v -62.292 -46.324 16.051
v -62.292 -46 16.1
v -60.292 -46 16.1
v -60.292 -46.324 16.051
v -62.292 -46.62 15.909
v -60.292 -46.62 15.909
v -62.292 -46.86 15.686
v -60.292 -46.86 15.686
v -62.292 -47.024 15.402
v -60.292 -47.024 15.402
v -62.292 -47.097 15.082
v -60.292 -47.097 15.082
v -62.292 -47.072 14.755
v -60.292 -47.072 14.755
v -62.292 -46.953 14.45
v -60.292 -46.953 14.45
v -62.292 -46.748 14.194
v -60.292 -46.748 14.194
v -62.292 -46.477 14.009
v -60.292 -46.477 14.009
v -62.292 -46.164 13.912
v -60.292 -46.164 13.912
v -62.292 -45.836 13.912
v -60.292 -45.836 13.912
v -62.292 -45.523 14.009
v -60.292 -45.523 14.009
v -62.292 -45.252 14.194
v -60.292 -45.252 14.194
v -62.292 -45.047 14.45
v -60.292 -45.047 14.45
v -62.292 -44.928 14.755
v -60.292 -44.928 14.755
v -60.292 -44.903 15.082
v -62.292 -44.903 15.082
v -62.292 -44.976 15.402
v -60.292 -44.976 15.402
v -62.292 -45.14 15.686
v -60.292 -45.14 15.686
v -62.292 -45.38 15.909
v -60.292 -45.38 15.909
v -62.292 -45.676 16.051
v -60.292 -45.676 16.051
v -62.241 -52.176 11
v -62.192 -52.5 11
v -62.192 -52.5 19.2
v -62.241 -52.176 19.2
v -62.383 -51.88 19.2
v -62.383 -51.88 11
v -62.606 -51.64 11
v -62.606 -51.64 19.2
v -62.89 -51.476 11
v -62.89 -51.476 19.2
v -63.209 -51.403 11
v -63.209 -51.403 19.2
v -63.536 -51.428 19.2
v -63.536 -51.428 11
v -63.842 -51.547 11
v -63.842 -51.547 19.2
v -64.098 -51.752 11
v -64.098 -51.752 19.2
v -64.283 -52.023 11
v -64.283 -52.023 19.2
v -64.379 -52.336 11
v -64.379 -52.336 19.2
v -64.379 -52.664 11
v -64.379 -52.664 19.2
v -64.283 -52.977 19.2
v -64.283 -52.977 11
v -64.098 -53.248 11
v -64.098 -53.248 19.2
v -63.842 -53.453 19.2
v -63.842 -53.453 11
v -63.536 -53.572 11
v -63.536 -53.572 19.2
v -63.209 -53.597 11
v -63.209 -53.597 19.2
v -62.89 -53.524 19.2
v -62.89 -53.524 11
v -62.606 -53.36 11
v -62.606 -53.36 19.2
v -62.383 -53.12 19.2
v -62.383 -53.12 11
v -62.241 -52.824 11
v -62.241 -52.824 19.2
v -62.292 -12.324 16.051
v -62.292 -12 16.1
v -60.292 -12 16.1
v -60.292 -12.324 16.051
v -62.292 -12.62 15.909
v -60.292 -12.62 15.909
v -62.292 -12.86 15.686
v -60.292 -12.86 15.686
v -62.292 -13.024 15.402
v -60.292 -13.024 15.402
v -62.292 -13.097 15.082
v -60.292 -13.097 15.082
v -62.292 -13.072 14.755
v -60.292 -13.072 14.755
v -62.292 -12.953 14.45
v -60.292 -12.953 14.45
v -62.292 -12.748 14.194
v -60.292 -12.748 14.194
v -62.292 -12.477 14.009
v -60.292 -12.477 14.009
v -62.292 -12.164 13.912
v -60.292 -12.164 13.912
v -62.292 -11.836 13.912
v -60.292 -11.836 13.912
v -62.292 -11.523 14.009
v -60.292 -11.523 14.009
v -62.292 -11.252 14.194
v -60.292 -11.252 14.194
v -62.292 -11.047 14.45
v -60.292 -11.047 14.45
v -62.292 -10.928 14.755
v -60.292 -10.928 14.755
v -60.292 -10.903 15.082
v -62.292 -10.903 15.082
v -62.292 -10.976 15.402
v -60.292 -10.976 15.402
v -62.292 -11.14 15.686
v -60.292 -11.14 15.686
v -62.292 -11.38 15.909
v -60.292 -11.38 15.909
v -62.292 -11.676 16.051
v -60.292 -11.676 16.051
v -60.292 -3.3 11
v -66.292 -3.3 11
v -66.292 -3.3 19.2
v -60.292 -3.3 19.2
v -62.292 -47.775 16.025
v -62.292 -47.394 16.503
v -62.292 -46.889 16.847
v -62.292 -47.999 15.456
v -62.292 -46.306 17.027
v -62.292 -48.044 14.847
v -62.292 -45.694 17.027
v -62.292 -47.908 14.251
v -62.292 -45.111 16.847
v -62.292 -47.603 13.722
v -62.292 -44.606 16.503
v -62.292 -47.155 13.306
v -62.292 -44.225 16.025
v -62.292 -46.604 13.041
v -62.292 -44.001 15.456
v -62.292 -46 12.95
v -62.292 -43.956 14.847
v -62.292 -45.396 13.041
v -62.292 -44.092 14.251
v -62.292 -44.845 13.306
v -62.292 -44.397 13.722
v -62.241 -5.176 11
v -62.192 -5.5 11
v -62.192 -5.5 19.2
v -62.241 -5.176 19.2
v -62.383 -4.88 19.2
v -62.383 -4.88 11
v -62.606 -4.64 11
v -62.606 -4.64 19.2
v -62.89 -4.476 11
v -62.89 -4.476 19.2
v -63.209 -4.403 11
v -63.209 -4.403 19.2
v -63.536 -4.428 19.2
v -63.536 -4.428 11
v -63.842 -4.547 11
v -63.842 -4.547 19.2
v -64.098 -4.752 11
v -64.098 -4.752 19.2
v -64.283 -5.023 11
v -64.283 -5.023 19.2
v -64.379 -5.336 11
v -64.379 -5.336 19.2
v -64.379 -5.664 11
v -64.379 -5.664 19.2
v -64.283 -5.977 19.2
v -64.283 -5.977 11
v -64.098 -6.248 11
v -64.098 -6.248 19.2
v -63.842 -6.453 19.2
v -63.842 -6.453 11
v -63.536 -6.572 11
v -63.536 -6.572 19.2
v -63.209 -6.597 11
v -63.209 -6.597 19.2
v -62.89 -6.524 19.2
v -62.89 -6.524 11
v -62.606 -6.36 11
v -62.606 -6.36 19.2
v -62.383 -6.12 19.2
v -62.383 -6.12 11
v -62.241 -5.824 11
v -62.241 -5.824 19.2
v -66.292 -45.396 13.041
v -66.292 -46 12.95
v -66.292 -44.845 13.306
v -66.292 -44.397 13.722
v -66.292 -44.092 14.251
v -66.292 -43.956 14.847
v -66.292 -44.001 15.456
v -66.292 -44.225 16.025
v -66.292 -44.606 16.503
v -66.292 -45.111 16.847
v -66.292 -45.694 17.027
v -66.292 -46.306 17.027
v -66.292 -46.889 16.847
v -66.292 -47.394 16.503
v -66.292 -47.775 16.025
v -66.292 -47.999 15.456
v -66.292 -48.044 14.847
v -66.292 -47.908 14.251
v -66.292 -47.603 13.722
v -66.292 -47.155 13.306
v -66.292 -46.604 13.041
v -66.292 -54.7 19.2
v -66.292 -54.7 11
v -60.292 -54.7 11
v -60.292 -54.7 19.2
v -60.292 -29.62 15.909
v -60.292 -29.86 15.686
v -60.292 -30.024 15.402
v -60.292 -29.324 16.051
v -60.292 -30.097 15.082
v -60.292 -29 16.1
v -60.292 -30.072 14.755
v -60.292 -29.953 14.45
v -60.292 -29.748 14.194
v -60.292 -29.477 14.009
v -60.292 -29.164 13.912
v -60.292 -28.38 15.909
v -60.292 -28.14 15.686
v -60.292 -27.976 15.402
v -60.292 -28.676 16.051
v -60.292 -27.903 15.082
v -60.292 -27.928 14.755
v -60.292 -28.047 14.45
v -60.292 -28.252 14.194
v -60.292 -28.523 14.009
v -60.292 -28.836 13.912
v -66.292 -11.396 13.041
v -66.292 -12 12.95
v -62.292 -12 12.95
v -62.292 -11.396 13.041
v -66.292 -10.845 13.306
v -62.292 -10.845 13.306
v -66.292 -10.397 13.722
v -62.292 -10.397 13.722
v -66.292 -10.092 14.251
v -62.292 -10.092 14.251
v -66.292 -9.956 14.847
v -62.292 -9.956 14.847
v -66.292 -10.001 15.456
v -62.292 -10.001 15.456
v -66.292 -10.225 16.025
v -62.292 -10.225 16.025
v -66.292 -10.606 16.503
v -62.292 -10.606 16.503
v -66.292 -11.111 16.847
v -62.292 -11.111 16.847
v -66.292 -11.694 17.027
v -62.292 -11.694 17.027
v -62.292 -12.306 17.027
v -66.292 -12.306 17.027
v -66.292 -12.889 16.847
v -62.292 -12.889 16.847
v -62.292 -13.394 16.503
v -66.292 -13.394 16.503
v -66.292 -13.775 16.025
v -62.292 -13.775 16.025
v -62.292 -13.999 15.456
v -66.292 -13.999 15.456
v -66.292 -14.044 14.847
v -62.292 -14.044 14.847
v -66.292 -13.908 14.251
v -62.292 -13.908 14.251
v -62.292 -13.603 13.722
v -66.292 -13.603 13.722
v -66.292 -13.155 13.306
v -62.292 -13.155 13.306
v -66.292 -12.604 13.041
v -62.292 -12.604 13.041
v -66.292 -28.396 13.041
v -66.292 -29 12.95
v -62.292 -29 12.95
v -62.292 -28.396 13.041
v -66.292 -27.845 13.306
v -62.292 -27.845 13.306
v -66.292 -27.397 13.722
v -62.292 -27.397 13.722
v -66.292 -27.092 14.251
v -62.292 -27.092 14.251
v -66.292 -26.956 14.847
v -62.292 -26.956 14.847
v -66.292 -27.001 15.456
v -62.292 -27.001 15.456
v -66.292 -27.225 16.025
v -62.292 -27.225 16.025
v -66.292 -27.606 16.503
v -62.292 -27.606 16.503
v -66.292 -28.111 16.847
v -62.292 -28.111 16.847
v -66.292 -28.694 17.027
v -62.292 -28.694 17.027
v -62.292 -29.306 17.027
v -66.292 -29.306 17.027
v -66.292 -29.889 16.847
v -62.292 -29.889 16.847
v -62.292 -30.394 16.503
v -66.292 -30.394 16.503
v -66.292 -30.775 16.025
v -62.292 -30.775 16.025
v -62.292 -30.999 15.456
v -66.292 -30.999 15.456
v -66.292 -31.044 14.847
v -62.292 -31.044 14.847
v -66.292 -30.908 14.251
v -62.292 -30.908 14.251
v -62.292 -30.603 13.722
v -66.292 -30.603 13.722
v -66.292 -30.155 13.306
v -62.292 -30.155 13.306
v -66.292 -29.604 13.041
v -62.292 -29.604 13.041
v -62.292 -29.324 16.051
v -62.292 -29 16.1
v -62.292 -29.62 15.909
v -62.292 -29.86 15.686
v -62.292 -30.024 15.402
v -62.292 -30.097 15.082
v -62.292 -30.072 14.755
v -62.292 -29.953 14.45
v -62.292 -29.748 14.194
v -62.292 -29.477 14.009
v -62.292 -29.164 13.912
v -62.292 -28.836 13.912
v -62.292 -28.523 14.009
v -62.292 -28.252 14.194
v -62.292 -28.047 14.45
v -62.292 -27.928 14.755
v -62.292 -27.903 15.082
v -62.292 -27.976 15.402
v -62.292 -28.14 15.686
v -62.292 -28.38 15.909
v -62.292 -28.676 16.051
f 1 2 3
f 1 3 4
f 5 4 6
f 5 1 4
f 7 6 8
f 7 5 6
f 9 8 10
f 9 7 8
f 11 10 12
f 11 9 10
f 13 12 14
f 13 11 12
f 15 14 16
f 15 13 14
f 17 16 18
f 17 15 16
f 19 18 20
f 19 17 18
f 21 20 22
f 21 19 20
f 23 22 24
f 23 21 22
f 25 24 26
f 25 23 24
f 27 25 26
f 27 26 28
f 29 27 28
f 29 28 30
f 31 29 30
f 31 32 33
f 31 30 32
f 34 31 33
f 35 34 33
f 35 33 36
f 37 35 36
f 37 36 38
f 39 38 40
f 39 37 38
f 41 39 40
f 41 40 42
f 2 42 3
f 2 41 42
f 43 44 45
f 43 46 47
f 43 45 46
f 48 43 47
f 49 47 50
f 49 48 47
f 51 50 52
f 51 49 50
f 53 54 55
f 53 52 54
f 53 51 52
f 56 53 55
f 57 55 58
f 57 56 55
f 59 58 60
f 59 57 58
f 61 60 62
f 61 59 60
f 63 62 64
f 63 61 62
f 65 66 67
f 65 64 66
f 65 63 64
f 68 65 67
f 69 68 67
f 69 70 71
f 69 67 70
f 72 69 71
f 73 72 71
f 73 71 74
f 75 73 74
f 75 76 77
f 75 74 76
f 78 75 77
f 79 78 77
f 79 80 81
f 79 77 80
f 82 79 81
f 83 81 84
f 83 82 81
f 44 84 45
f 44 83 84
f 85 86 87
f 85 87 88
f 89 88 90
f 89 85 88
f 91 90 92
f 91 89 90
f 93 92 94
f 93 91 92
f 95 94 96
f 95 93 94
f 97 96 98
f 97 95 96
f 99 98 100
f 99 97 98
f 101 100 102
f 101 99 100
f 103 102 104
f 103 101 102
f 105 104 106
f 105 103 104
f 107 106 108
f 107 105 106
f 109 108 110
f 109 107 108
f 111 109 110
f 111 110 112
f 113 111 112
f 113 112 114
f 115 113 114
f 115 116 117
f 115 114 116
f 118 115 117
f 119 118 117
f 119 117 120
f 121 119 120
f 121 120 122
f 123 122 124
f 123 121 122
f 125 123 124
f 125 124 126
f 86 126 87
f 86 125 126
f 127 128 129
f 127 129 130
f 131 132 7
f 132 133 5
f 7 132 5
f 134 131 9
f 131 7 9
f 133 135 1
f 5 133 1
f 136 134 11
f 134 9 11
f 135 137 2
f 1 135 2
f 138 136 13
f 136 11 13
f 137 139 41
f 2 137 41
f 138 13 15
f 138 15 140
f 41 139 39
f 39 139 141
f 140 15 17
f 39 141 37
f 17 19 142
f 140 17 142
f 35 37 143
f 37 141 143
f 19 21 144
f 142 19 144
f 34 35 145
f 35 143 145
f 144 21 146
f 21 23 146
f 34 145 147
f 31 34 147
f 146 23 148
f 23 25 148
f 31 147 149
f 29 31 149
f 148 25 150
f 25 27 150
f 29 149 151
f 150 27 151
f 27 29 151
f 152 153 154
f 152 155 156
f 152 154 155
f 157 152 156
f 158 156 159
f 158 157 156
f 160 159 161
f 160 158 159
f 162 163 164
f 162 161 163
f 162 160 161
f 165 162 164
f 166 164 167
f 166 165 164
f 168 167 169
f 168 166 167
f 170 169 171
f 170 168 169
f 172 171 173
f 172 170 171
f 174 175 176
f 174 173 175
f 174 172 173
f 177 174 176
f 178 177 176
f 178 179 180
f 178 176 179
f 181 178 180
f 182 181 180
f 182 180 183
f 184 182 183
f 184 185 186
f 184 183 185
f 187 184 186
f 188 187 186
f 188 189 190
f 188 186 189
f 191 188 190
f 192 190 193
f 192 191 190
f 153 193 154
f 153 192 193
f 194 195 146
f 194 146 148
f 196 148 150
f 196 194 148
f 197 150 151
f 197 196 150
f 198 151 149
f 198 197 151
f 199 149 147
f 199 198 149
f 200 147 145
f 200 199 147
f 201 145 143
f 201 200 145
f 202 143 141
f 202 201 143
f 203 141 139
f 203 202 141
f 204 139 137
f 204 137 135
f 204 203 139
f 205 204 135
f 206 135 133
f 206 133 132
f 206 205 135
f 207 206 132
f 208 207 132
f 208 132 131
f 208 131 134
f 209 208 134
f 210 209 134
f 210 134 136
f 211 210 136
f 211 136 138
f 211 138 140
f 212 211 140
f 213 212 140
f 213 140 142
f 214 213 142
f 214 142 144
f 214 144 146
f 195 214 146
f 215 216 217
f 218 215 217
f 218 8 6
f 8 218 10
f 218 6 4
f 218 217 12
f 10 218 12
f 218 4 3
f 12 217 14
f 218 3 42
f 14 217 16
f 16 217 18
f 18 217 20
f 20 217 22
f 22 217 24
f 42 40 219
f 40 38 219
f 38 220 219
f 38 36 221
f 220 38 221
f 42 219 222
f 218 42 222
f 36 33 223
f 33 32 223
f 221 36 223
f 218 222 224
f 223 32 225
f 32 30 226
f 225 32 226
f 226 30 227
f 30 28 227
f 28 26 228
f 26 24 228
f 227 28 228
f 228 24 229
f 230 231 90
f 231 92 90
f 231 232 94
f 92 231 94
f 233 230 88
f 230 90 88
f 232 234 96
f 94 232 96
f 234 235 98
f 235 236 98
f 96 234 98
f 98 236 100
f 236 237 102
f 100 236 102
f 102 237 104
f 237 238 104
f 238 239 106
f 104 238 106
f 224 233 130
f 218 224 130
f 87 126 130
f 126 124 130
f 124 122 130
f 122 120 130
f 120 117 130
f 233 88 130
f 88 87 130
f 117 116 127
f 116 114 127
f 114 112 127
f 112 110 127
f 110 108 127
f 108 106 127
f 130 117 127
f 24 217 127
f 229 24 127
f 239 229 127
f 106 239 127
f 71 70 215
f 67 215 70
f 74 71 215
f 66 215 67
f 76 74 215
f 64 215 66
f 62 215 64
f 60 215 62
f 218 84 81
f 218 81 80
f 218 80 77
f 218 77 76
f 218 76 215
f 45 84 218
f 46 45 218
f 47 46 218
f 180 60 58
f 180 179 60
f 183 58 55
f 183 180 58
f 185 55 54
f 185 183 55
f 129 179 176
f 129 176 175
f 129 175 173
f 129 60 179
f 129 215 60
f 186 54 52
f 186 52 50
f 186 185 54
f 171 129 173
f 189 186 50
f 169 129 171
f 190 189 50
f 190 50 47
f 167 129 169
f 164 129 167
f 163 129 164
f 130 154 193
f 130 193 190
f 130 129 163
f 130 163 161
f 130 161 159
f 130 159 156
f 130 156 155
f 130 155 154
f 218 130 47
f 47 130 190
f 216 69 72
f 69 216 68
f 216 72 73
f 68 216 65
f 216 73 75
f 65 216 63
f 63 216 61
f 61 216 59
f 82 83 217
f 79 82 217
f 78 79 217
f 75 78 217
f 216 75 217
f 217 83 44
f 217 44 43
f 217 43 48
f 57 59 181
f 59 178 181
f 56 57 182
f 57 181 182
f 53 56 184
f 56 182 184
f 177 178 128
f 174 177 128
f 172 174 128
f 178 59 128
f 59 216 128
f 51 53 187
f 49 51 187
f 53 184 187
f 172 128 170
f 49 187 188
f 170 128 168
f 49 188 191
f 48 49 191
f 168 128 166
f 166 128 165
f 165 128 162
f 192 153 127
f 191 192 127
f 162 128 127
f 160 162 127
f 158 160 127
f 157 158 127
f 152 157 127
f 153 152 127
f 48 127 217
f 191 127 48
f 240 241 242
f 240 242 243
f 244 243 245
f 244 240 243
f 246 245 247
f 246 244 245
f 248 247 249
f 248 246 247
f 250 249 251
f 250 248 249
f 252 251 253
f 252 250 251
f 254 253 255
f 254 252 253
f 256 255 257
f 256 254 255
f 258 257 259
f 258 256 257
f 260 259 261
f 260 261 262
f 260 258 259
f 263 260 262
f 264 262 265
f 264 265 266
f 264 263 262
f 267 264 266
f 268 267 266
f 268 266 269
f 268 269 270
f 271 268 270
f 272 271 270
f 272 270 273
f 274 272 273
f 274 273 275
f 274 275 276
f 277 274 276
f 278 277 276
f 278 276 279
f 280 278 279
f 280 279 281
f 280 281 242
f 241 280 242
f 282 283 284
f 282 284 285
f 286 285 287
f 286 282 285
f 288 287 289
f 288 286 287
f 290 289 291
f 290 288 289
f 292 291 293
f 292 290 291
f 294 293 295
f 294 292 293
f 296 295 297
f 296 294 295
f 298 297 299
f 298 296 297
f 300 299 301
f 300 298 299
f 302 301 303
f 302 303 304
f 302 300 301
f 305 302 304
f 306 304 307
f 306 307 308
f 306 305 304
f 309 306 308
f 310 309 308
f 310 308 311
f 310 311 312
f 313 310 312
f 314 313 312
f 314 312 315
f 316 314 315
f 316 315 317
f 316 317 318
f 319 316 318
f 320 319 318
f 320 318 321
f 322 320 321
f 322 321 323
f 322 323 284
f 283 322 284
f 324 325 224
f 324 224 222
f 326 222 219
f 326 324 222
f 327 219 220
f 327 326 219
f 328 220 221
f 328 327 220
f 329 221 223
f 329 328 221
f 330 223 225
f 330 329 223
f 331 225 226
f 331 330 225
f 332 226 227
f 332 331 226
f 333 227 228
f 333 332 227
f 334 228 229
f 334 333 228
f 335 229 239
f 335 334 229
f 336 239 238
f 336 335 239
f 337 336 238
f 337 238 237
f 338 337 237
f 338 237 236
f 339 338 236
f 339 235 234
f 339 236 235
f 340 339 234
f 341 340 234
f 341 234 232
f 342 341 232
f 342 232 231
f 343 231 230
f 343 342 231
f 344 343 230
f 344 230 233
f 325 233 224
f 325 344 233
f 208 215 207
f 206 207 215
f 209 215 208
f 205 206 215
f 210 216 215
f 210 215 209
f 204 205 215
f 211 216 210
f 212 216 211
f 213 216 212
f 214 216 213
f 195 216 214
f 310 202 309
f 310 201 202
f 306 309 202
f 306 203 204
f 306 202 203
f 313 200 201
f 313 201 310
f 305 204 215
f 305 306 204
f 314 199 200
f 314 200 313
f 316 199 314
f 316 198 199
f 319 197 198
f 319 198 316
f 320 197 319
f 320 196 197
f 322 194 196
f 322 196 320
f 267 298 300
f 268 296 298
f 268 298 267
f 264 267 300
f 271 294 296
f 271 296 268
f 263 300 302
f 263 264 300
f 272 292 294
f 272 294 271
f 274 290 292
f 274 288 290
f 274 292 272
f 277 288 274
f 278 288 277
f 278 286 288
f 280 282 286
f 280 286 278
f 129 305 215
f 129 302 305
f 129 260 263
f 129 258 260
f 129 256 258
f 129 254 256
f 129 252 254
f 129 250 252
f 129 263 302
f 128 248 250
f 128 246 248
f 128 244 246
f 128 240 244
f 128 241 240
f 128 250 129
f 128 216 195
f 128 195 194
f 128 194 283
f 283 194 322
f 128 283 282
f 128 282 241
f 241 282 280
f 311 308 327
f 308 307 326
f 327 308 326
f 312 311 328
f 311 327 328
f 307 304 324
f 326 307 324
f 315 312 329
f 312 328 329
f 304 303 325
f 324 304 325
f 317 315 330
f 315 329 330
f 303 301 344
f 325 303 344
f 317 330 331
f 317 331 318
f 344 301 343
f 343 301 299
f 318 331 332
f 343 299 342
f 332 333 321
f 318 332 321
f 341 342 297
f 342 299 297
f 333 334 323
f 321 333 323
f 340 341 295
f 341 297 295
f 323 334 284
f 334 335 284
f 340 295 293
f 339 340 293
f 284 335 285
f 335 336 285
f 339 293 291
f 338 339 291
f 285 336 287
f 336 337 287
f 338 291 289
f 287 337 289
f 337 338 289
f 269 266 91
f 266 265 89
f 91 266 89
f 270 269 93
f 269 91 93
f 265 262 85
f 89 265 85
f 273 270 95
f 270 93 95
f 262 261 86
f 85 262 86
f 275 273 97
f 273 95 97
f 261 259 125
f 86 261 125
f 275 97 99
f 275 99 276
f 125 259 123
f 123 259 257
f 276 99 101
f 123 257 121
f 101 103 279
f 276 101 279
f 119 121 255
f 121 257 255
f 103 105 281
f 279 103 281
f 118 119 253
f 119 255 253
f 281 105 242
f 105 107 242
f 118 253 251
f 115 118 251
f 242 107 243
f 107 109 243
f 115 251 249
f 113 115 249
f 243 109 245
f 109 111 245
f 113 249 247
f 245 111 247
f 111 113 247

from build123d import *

# Parameters (mm, degrees)
BLOCK_OUTLINE_W                            = 6
BLOCK_OUTLINE_H                            = 51.4
REACTION_BLOCK_THICKNESS_DEPTH             = 8.2
LANE_1_INNER_CABLE_CLEARANCE_PROFILE_R     = 1.1
LANE_1_INNER_CABLE_CLEARANCE_DEPTH         = 6.2
LANE_1_COMPRESSION_HOUSING_SOCKET_PROFIL_R = 2.05
LANE_1_COMPRESSION_HOUSING_SOCKET_DEPTH    = 4.1
LANE_2_INNER_CABLE_CLEARANCE_PROFILE_R     = 1.1
LANE_2_INNER_CABLE_CLEARANCE_DEPTH         = 6.2
LANE_2_COMPRESSION_HOUSING_SOCKET_PROFIL_R = 2.05
LANE_2_COMPRESSION_HOUSING_SOCKET_DEPTH    = 4.1
LANE_3_INNER_CABLE_CLEARANCE_PROFILE_R     = 1.1
LANE_3_INNER_CABLE_CLEARANCE_DEPTH         = 6.2
LANE_3_COMPRESSION_HOUSING_SOCKET_PROFIL_R = 2.05
LANE_3_COMPRESSION_HOUSING_SOCKET_DEPTH    = 4.1
M2_FIXING_CLEARANCE_1_PROFILE_R            = 1.1
M2_FIXING_CLEARANCE_1_DEPTH                = 8.4
M2_FIXING_CLEARANCE_2_PROFILE_R            = 1.1
M2_FIXING_CLEARANCE_2_DEPTH                = 8.4


with BuildPart() as part:
    # Block outline → Reaction block thickness (new body)
    with BuildSketch(Plane.XY.offset(11)):
        with Locations((-63.291651246, -29)):
            Rectangle(BLOCK_OUTLINE_W, BLOCK_OUTLINE_H)
    extrude(amount=REACTION_BLOCK_THICKNESS_DEPTH)

    # Lane 1 inner cable clearance profile → Lane 1 inner cable clearance (cut)
    with BuildSketch(Plane(origin=(-66.391651246, 0, 0), x_dir=(0, 0, -1), z_dir=(1, 0, 0))):
        with Locations(Location((-15, -12, 0), (0, 0, 180))):
            Circle(LANE_1_INNER_CABLE_CLEARANCE_PROFILE_R)
    extrude(amount=LANE_1_INNER_CABLE_CLEARANCE_DEPTH, mode=Mode.SUBTRACT)

    # Lane 1 compression housing socket profil → Lane 1 compression housing socket (cut)
    with BuildSketch(Plane(origin=(-66.391651246, 0, 0), x_dir=(0, 0, -1), z_dir=(1, 0, 0))):
        with Locations((-15, -12)):
            Circle(LANE_1_COMPRESSION_HOUSING_SOCKET_PROFIL_R)
    extrude(amount=LANE_1_COMPRESSION_HOUSING_SOCKET_DEPTH, mode=Mode.SUBTRACT)

    # Lane 2 inner cable clearance profile → Lane 2 inner cable clearance (cut)
    with BuildSketch(Plane(origin=(-66.391651246, 0, 0), x_dir=(0, 0, -1), z_dir=(1, 0, 0))):
        with Locations(Location((-15, -29, 0), (0, 0, 180))):
            Circle(LANE_2_INNER_CABLE_CLEARANCE_PROFILE_R)
    extrude(amount=LANE_2_INNER_CABLE_CLEARANCE_DEPTH, mode=Mode.SUBTRACT)

    # Lane 2 compression housing socket profil → Lane 2 compression housing socket (cut)
    with BuildSketch(Plane(origin=(-66.391651246, 0, 0), x_dir=(0, 0, -1), z_dir=(1, 0, 0))):
        with Locations((-15, -29)):
            Circle(LANE_2_COMPRESSION_HOUSING_SOCKET_PROFIL_R)
    extrude(amount=LANE_2_COMPRESSION_HOUSING_SOCKET_DEPTH, mode=Mode.SUBTRACT)

    # Lane 3 inner cable clearance profile → Lane 3 inner cable clearance (cut)
    with BuildSketch(Plane(origin=(-66.391651246, 0, 0), x_dir=(0, 0, -1), z_dir=(1, 0, 0))):
        with Locations(Location((-15, -46, 0), (0, 0, 180))):
            Circle(LANE_3_INNER_CABLE_CLEARANCE_PROFILE_R)
    extrude(amount=LANE_3_INNER_CABLE_CLEARANCE_DEPTH, mode=Mode.SUBTRACT)

    # Lane 3 compression housing socket profil → Lane 3 compression housing socket (cut)
    with BuildSketch(Plane(origin=(-66.391651246, 0, 0), x_dir=(0, 0, -1), z_dir=(1, 0, 0))):
        with Locations((-15, -46)):
            Circle(LANE_3_COMPRESSION_HOUSING_SOCKET_PROFIL_R)
    extrude(amount=LANE_3_COMPRESSION_HOUSING_SOCKET_DEPTH, mode=Mode.SUBTRACT)

    # M2 fixing clearance 1 profile → M2 fixing clearance 1 (cut)
    with BuildSketch(Plane.XY.offset(10.9)):
        with Locations((-63.291651246, -5.5)):
            Circle(M2_FIXING_CLEARANCE_1_PROFILE_R)
    extrude(amount=M2_FIXING_CLEARANCE_1_DEPTH, mode=Mode.SUBTRACT)

    # M2 fixing clearance 2 profile → M2 fixing clearance 2 (cut)
    with BuildSketch(Plane.XY.offset(10.9)):
        with Locations((-63.291651246, -52.5)):
            Circle(M2_FIXING_CLEARANCE_2_PROFILE_R)
    extrude(amount=M2_FIXING_CLEARANCE_2_DEPTH, mode=Mode.SUBTRACT)


solid = part.part
